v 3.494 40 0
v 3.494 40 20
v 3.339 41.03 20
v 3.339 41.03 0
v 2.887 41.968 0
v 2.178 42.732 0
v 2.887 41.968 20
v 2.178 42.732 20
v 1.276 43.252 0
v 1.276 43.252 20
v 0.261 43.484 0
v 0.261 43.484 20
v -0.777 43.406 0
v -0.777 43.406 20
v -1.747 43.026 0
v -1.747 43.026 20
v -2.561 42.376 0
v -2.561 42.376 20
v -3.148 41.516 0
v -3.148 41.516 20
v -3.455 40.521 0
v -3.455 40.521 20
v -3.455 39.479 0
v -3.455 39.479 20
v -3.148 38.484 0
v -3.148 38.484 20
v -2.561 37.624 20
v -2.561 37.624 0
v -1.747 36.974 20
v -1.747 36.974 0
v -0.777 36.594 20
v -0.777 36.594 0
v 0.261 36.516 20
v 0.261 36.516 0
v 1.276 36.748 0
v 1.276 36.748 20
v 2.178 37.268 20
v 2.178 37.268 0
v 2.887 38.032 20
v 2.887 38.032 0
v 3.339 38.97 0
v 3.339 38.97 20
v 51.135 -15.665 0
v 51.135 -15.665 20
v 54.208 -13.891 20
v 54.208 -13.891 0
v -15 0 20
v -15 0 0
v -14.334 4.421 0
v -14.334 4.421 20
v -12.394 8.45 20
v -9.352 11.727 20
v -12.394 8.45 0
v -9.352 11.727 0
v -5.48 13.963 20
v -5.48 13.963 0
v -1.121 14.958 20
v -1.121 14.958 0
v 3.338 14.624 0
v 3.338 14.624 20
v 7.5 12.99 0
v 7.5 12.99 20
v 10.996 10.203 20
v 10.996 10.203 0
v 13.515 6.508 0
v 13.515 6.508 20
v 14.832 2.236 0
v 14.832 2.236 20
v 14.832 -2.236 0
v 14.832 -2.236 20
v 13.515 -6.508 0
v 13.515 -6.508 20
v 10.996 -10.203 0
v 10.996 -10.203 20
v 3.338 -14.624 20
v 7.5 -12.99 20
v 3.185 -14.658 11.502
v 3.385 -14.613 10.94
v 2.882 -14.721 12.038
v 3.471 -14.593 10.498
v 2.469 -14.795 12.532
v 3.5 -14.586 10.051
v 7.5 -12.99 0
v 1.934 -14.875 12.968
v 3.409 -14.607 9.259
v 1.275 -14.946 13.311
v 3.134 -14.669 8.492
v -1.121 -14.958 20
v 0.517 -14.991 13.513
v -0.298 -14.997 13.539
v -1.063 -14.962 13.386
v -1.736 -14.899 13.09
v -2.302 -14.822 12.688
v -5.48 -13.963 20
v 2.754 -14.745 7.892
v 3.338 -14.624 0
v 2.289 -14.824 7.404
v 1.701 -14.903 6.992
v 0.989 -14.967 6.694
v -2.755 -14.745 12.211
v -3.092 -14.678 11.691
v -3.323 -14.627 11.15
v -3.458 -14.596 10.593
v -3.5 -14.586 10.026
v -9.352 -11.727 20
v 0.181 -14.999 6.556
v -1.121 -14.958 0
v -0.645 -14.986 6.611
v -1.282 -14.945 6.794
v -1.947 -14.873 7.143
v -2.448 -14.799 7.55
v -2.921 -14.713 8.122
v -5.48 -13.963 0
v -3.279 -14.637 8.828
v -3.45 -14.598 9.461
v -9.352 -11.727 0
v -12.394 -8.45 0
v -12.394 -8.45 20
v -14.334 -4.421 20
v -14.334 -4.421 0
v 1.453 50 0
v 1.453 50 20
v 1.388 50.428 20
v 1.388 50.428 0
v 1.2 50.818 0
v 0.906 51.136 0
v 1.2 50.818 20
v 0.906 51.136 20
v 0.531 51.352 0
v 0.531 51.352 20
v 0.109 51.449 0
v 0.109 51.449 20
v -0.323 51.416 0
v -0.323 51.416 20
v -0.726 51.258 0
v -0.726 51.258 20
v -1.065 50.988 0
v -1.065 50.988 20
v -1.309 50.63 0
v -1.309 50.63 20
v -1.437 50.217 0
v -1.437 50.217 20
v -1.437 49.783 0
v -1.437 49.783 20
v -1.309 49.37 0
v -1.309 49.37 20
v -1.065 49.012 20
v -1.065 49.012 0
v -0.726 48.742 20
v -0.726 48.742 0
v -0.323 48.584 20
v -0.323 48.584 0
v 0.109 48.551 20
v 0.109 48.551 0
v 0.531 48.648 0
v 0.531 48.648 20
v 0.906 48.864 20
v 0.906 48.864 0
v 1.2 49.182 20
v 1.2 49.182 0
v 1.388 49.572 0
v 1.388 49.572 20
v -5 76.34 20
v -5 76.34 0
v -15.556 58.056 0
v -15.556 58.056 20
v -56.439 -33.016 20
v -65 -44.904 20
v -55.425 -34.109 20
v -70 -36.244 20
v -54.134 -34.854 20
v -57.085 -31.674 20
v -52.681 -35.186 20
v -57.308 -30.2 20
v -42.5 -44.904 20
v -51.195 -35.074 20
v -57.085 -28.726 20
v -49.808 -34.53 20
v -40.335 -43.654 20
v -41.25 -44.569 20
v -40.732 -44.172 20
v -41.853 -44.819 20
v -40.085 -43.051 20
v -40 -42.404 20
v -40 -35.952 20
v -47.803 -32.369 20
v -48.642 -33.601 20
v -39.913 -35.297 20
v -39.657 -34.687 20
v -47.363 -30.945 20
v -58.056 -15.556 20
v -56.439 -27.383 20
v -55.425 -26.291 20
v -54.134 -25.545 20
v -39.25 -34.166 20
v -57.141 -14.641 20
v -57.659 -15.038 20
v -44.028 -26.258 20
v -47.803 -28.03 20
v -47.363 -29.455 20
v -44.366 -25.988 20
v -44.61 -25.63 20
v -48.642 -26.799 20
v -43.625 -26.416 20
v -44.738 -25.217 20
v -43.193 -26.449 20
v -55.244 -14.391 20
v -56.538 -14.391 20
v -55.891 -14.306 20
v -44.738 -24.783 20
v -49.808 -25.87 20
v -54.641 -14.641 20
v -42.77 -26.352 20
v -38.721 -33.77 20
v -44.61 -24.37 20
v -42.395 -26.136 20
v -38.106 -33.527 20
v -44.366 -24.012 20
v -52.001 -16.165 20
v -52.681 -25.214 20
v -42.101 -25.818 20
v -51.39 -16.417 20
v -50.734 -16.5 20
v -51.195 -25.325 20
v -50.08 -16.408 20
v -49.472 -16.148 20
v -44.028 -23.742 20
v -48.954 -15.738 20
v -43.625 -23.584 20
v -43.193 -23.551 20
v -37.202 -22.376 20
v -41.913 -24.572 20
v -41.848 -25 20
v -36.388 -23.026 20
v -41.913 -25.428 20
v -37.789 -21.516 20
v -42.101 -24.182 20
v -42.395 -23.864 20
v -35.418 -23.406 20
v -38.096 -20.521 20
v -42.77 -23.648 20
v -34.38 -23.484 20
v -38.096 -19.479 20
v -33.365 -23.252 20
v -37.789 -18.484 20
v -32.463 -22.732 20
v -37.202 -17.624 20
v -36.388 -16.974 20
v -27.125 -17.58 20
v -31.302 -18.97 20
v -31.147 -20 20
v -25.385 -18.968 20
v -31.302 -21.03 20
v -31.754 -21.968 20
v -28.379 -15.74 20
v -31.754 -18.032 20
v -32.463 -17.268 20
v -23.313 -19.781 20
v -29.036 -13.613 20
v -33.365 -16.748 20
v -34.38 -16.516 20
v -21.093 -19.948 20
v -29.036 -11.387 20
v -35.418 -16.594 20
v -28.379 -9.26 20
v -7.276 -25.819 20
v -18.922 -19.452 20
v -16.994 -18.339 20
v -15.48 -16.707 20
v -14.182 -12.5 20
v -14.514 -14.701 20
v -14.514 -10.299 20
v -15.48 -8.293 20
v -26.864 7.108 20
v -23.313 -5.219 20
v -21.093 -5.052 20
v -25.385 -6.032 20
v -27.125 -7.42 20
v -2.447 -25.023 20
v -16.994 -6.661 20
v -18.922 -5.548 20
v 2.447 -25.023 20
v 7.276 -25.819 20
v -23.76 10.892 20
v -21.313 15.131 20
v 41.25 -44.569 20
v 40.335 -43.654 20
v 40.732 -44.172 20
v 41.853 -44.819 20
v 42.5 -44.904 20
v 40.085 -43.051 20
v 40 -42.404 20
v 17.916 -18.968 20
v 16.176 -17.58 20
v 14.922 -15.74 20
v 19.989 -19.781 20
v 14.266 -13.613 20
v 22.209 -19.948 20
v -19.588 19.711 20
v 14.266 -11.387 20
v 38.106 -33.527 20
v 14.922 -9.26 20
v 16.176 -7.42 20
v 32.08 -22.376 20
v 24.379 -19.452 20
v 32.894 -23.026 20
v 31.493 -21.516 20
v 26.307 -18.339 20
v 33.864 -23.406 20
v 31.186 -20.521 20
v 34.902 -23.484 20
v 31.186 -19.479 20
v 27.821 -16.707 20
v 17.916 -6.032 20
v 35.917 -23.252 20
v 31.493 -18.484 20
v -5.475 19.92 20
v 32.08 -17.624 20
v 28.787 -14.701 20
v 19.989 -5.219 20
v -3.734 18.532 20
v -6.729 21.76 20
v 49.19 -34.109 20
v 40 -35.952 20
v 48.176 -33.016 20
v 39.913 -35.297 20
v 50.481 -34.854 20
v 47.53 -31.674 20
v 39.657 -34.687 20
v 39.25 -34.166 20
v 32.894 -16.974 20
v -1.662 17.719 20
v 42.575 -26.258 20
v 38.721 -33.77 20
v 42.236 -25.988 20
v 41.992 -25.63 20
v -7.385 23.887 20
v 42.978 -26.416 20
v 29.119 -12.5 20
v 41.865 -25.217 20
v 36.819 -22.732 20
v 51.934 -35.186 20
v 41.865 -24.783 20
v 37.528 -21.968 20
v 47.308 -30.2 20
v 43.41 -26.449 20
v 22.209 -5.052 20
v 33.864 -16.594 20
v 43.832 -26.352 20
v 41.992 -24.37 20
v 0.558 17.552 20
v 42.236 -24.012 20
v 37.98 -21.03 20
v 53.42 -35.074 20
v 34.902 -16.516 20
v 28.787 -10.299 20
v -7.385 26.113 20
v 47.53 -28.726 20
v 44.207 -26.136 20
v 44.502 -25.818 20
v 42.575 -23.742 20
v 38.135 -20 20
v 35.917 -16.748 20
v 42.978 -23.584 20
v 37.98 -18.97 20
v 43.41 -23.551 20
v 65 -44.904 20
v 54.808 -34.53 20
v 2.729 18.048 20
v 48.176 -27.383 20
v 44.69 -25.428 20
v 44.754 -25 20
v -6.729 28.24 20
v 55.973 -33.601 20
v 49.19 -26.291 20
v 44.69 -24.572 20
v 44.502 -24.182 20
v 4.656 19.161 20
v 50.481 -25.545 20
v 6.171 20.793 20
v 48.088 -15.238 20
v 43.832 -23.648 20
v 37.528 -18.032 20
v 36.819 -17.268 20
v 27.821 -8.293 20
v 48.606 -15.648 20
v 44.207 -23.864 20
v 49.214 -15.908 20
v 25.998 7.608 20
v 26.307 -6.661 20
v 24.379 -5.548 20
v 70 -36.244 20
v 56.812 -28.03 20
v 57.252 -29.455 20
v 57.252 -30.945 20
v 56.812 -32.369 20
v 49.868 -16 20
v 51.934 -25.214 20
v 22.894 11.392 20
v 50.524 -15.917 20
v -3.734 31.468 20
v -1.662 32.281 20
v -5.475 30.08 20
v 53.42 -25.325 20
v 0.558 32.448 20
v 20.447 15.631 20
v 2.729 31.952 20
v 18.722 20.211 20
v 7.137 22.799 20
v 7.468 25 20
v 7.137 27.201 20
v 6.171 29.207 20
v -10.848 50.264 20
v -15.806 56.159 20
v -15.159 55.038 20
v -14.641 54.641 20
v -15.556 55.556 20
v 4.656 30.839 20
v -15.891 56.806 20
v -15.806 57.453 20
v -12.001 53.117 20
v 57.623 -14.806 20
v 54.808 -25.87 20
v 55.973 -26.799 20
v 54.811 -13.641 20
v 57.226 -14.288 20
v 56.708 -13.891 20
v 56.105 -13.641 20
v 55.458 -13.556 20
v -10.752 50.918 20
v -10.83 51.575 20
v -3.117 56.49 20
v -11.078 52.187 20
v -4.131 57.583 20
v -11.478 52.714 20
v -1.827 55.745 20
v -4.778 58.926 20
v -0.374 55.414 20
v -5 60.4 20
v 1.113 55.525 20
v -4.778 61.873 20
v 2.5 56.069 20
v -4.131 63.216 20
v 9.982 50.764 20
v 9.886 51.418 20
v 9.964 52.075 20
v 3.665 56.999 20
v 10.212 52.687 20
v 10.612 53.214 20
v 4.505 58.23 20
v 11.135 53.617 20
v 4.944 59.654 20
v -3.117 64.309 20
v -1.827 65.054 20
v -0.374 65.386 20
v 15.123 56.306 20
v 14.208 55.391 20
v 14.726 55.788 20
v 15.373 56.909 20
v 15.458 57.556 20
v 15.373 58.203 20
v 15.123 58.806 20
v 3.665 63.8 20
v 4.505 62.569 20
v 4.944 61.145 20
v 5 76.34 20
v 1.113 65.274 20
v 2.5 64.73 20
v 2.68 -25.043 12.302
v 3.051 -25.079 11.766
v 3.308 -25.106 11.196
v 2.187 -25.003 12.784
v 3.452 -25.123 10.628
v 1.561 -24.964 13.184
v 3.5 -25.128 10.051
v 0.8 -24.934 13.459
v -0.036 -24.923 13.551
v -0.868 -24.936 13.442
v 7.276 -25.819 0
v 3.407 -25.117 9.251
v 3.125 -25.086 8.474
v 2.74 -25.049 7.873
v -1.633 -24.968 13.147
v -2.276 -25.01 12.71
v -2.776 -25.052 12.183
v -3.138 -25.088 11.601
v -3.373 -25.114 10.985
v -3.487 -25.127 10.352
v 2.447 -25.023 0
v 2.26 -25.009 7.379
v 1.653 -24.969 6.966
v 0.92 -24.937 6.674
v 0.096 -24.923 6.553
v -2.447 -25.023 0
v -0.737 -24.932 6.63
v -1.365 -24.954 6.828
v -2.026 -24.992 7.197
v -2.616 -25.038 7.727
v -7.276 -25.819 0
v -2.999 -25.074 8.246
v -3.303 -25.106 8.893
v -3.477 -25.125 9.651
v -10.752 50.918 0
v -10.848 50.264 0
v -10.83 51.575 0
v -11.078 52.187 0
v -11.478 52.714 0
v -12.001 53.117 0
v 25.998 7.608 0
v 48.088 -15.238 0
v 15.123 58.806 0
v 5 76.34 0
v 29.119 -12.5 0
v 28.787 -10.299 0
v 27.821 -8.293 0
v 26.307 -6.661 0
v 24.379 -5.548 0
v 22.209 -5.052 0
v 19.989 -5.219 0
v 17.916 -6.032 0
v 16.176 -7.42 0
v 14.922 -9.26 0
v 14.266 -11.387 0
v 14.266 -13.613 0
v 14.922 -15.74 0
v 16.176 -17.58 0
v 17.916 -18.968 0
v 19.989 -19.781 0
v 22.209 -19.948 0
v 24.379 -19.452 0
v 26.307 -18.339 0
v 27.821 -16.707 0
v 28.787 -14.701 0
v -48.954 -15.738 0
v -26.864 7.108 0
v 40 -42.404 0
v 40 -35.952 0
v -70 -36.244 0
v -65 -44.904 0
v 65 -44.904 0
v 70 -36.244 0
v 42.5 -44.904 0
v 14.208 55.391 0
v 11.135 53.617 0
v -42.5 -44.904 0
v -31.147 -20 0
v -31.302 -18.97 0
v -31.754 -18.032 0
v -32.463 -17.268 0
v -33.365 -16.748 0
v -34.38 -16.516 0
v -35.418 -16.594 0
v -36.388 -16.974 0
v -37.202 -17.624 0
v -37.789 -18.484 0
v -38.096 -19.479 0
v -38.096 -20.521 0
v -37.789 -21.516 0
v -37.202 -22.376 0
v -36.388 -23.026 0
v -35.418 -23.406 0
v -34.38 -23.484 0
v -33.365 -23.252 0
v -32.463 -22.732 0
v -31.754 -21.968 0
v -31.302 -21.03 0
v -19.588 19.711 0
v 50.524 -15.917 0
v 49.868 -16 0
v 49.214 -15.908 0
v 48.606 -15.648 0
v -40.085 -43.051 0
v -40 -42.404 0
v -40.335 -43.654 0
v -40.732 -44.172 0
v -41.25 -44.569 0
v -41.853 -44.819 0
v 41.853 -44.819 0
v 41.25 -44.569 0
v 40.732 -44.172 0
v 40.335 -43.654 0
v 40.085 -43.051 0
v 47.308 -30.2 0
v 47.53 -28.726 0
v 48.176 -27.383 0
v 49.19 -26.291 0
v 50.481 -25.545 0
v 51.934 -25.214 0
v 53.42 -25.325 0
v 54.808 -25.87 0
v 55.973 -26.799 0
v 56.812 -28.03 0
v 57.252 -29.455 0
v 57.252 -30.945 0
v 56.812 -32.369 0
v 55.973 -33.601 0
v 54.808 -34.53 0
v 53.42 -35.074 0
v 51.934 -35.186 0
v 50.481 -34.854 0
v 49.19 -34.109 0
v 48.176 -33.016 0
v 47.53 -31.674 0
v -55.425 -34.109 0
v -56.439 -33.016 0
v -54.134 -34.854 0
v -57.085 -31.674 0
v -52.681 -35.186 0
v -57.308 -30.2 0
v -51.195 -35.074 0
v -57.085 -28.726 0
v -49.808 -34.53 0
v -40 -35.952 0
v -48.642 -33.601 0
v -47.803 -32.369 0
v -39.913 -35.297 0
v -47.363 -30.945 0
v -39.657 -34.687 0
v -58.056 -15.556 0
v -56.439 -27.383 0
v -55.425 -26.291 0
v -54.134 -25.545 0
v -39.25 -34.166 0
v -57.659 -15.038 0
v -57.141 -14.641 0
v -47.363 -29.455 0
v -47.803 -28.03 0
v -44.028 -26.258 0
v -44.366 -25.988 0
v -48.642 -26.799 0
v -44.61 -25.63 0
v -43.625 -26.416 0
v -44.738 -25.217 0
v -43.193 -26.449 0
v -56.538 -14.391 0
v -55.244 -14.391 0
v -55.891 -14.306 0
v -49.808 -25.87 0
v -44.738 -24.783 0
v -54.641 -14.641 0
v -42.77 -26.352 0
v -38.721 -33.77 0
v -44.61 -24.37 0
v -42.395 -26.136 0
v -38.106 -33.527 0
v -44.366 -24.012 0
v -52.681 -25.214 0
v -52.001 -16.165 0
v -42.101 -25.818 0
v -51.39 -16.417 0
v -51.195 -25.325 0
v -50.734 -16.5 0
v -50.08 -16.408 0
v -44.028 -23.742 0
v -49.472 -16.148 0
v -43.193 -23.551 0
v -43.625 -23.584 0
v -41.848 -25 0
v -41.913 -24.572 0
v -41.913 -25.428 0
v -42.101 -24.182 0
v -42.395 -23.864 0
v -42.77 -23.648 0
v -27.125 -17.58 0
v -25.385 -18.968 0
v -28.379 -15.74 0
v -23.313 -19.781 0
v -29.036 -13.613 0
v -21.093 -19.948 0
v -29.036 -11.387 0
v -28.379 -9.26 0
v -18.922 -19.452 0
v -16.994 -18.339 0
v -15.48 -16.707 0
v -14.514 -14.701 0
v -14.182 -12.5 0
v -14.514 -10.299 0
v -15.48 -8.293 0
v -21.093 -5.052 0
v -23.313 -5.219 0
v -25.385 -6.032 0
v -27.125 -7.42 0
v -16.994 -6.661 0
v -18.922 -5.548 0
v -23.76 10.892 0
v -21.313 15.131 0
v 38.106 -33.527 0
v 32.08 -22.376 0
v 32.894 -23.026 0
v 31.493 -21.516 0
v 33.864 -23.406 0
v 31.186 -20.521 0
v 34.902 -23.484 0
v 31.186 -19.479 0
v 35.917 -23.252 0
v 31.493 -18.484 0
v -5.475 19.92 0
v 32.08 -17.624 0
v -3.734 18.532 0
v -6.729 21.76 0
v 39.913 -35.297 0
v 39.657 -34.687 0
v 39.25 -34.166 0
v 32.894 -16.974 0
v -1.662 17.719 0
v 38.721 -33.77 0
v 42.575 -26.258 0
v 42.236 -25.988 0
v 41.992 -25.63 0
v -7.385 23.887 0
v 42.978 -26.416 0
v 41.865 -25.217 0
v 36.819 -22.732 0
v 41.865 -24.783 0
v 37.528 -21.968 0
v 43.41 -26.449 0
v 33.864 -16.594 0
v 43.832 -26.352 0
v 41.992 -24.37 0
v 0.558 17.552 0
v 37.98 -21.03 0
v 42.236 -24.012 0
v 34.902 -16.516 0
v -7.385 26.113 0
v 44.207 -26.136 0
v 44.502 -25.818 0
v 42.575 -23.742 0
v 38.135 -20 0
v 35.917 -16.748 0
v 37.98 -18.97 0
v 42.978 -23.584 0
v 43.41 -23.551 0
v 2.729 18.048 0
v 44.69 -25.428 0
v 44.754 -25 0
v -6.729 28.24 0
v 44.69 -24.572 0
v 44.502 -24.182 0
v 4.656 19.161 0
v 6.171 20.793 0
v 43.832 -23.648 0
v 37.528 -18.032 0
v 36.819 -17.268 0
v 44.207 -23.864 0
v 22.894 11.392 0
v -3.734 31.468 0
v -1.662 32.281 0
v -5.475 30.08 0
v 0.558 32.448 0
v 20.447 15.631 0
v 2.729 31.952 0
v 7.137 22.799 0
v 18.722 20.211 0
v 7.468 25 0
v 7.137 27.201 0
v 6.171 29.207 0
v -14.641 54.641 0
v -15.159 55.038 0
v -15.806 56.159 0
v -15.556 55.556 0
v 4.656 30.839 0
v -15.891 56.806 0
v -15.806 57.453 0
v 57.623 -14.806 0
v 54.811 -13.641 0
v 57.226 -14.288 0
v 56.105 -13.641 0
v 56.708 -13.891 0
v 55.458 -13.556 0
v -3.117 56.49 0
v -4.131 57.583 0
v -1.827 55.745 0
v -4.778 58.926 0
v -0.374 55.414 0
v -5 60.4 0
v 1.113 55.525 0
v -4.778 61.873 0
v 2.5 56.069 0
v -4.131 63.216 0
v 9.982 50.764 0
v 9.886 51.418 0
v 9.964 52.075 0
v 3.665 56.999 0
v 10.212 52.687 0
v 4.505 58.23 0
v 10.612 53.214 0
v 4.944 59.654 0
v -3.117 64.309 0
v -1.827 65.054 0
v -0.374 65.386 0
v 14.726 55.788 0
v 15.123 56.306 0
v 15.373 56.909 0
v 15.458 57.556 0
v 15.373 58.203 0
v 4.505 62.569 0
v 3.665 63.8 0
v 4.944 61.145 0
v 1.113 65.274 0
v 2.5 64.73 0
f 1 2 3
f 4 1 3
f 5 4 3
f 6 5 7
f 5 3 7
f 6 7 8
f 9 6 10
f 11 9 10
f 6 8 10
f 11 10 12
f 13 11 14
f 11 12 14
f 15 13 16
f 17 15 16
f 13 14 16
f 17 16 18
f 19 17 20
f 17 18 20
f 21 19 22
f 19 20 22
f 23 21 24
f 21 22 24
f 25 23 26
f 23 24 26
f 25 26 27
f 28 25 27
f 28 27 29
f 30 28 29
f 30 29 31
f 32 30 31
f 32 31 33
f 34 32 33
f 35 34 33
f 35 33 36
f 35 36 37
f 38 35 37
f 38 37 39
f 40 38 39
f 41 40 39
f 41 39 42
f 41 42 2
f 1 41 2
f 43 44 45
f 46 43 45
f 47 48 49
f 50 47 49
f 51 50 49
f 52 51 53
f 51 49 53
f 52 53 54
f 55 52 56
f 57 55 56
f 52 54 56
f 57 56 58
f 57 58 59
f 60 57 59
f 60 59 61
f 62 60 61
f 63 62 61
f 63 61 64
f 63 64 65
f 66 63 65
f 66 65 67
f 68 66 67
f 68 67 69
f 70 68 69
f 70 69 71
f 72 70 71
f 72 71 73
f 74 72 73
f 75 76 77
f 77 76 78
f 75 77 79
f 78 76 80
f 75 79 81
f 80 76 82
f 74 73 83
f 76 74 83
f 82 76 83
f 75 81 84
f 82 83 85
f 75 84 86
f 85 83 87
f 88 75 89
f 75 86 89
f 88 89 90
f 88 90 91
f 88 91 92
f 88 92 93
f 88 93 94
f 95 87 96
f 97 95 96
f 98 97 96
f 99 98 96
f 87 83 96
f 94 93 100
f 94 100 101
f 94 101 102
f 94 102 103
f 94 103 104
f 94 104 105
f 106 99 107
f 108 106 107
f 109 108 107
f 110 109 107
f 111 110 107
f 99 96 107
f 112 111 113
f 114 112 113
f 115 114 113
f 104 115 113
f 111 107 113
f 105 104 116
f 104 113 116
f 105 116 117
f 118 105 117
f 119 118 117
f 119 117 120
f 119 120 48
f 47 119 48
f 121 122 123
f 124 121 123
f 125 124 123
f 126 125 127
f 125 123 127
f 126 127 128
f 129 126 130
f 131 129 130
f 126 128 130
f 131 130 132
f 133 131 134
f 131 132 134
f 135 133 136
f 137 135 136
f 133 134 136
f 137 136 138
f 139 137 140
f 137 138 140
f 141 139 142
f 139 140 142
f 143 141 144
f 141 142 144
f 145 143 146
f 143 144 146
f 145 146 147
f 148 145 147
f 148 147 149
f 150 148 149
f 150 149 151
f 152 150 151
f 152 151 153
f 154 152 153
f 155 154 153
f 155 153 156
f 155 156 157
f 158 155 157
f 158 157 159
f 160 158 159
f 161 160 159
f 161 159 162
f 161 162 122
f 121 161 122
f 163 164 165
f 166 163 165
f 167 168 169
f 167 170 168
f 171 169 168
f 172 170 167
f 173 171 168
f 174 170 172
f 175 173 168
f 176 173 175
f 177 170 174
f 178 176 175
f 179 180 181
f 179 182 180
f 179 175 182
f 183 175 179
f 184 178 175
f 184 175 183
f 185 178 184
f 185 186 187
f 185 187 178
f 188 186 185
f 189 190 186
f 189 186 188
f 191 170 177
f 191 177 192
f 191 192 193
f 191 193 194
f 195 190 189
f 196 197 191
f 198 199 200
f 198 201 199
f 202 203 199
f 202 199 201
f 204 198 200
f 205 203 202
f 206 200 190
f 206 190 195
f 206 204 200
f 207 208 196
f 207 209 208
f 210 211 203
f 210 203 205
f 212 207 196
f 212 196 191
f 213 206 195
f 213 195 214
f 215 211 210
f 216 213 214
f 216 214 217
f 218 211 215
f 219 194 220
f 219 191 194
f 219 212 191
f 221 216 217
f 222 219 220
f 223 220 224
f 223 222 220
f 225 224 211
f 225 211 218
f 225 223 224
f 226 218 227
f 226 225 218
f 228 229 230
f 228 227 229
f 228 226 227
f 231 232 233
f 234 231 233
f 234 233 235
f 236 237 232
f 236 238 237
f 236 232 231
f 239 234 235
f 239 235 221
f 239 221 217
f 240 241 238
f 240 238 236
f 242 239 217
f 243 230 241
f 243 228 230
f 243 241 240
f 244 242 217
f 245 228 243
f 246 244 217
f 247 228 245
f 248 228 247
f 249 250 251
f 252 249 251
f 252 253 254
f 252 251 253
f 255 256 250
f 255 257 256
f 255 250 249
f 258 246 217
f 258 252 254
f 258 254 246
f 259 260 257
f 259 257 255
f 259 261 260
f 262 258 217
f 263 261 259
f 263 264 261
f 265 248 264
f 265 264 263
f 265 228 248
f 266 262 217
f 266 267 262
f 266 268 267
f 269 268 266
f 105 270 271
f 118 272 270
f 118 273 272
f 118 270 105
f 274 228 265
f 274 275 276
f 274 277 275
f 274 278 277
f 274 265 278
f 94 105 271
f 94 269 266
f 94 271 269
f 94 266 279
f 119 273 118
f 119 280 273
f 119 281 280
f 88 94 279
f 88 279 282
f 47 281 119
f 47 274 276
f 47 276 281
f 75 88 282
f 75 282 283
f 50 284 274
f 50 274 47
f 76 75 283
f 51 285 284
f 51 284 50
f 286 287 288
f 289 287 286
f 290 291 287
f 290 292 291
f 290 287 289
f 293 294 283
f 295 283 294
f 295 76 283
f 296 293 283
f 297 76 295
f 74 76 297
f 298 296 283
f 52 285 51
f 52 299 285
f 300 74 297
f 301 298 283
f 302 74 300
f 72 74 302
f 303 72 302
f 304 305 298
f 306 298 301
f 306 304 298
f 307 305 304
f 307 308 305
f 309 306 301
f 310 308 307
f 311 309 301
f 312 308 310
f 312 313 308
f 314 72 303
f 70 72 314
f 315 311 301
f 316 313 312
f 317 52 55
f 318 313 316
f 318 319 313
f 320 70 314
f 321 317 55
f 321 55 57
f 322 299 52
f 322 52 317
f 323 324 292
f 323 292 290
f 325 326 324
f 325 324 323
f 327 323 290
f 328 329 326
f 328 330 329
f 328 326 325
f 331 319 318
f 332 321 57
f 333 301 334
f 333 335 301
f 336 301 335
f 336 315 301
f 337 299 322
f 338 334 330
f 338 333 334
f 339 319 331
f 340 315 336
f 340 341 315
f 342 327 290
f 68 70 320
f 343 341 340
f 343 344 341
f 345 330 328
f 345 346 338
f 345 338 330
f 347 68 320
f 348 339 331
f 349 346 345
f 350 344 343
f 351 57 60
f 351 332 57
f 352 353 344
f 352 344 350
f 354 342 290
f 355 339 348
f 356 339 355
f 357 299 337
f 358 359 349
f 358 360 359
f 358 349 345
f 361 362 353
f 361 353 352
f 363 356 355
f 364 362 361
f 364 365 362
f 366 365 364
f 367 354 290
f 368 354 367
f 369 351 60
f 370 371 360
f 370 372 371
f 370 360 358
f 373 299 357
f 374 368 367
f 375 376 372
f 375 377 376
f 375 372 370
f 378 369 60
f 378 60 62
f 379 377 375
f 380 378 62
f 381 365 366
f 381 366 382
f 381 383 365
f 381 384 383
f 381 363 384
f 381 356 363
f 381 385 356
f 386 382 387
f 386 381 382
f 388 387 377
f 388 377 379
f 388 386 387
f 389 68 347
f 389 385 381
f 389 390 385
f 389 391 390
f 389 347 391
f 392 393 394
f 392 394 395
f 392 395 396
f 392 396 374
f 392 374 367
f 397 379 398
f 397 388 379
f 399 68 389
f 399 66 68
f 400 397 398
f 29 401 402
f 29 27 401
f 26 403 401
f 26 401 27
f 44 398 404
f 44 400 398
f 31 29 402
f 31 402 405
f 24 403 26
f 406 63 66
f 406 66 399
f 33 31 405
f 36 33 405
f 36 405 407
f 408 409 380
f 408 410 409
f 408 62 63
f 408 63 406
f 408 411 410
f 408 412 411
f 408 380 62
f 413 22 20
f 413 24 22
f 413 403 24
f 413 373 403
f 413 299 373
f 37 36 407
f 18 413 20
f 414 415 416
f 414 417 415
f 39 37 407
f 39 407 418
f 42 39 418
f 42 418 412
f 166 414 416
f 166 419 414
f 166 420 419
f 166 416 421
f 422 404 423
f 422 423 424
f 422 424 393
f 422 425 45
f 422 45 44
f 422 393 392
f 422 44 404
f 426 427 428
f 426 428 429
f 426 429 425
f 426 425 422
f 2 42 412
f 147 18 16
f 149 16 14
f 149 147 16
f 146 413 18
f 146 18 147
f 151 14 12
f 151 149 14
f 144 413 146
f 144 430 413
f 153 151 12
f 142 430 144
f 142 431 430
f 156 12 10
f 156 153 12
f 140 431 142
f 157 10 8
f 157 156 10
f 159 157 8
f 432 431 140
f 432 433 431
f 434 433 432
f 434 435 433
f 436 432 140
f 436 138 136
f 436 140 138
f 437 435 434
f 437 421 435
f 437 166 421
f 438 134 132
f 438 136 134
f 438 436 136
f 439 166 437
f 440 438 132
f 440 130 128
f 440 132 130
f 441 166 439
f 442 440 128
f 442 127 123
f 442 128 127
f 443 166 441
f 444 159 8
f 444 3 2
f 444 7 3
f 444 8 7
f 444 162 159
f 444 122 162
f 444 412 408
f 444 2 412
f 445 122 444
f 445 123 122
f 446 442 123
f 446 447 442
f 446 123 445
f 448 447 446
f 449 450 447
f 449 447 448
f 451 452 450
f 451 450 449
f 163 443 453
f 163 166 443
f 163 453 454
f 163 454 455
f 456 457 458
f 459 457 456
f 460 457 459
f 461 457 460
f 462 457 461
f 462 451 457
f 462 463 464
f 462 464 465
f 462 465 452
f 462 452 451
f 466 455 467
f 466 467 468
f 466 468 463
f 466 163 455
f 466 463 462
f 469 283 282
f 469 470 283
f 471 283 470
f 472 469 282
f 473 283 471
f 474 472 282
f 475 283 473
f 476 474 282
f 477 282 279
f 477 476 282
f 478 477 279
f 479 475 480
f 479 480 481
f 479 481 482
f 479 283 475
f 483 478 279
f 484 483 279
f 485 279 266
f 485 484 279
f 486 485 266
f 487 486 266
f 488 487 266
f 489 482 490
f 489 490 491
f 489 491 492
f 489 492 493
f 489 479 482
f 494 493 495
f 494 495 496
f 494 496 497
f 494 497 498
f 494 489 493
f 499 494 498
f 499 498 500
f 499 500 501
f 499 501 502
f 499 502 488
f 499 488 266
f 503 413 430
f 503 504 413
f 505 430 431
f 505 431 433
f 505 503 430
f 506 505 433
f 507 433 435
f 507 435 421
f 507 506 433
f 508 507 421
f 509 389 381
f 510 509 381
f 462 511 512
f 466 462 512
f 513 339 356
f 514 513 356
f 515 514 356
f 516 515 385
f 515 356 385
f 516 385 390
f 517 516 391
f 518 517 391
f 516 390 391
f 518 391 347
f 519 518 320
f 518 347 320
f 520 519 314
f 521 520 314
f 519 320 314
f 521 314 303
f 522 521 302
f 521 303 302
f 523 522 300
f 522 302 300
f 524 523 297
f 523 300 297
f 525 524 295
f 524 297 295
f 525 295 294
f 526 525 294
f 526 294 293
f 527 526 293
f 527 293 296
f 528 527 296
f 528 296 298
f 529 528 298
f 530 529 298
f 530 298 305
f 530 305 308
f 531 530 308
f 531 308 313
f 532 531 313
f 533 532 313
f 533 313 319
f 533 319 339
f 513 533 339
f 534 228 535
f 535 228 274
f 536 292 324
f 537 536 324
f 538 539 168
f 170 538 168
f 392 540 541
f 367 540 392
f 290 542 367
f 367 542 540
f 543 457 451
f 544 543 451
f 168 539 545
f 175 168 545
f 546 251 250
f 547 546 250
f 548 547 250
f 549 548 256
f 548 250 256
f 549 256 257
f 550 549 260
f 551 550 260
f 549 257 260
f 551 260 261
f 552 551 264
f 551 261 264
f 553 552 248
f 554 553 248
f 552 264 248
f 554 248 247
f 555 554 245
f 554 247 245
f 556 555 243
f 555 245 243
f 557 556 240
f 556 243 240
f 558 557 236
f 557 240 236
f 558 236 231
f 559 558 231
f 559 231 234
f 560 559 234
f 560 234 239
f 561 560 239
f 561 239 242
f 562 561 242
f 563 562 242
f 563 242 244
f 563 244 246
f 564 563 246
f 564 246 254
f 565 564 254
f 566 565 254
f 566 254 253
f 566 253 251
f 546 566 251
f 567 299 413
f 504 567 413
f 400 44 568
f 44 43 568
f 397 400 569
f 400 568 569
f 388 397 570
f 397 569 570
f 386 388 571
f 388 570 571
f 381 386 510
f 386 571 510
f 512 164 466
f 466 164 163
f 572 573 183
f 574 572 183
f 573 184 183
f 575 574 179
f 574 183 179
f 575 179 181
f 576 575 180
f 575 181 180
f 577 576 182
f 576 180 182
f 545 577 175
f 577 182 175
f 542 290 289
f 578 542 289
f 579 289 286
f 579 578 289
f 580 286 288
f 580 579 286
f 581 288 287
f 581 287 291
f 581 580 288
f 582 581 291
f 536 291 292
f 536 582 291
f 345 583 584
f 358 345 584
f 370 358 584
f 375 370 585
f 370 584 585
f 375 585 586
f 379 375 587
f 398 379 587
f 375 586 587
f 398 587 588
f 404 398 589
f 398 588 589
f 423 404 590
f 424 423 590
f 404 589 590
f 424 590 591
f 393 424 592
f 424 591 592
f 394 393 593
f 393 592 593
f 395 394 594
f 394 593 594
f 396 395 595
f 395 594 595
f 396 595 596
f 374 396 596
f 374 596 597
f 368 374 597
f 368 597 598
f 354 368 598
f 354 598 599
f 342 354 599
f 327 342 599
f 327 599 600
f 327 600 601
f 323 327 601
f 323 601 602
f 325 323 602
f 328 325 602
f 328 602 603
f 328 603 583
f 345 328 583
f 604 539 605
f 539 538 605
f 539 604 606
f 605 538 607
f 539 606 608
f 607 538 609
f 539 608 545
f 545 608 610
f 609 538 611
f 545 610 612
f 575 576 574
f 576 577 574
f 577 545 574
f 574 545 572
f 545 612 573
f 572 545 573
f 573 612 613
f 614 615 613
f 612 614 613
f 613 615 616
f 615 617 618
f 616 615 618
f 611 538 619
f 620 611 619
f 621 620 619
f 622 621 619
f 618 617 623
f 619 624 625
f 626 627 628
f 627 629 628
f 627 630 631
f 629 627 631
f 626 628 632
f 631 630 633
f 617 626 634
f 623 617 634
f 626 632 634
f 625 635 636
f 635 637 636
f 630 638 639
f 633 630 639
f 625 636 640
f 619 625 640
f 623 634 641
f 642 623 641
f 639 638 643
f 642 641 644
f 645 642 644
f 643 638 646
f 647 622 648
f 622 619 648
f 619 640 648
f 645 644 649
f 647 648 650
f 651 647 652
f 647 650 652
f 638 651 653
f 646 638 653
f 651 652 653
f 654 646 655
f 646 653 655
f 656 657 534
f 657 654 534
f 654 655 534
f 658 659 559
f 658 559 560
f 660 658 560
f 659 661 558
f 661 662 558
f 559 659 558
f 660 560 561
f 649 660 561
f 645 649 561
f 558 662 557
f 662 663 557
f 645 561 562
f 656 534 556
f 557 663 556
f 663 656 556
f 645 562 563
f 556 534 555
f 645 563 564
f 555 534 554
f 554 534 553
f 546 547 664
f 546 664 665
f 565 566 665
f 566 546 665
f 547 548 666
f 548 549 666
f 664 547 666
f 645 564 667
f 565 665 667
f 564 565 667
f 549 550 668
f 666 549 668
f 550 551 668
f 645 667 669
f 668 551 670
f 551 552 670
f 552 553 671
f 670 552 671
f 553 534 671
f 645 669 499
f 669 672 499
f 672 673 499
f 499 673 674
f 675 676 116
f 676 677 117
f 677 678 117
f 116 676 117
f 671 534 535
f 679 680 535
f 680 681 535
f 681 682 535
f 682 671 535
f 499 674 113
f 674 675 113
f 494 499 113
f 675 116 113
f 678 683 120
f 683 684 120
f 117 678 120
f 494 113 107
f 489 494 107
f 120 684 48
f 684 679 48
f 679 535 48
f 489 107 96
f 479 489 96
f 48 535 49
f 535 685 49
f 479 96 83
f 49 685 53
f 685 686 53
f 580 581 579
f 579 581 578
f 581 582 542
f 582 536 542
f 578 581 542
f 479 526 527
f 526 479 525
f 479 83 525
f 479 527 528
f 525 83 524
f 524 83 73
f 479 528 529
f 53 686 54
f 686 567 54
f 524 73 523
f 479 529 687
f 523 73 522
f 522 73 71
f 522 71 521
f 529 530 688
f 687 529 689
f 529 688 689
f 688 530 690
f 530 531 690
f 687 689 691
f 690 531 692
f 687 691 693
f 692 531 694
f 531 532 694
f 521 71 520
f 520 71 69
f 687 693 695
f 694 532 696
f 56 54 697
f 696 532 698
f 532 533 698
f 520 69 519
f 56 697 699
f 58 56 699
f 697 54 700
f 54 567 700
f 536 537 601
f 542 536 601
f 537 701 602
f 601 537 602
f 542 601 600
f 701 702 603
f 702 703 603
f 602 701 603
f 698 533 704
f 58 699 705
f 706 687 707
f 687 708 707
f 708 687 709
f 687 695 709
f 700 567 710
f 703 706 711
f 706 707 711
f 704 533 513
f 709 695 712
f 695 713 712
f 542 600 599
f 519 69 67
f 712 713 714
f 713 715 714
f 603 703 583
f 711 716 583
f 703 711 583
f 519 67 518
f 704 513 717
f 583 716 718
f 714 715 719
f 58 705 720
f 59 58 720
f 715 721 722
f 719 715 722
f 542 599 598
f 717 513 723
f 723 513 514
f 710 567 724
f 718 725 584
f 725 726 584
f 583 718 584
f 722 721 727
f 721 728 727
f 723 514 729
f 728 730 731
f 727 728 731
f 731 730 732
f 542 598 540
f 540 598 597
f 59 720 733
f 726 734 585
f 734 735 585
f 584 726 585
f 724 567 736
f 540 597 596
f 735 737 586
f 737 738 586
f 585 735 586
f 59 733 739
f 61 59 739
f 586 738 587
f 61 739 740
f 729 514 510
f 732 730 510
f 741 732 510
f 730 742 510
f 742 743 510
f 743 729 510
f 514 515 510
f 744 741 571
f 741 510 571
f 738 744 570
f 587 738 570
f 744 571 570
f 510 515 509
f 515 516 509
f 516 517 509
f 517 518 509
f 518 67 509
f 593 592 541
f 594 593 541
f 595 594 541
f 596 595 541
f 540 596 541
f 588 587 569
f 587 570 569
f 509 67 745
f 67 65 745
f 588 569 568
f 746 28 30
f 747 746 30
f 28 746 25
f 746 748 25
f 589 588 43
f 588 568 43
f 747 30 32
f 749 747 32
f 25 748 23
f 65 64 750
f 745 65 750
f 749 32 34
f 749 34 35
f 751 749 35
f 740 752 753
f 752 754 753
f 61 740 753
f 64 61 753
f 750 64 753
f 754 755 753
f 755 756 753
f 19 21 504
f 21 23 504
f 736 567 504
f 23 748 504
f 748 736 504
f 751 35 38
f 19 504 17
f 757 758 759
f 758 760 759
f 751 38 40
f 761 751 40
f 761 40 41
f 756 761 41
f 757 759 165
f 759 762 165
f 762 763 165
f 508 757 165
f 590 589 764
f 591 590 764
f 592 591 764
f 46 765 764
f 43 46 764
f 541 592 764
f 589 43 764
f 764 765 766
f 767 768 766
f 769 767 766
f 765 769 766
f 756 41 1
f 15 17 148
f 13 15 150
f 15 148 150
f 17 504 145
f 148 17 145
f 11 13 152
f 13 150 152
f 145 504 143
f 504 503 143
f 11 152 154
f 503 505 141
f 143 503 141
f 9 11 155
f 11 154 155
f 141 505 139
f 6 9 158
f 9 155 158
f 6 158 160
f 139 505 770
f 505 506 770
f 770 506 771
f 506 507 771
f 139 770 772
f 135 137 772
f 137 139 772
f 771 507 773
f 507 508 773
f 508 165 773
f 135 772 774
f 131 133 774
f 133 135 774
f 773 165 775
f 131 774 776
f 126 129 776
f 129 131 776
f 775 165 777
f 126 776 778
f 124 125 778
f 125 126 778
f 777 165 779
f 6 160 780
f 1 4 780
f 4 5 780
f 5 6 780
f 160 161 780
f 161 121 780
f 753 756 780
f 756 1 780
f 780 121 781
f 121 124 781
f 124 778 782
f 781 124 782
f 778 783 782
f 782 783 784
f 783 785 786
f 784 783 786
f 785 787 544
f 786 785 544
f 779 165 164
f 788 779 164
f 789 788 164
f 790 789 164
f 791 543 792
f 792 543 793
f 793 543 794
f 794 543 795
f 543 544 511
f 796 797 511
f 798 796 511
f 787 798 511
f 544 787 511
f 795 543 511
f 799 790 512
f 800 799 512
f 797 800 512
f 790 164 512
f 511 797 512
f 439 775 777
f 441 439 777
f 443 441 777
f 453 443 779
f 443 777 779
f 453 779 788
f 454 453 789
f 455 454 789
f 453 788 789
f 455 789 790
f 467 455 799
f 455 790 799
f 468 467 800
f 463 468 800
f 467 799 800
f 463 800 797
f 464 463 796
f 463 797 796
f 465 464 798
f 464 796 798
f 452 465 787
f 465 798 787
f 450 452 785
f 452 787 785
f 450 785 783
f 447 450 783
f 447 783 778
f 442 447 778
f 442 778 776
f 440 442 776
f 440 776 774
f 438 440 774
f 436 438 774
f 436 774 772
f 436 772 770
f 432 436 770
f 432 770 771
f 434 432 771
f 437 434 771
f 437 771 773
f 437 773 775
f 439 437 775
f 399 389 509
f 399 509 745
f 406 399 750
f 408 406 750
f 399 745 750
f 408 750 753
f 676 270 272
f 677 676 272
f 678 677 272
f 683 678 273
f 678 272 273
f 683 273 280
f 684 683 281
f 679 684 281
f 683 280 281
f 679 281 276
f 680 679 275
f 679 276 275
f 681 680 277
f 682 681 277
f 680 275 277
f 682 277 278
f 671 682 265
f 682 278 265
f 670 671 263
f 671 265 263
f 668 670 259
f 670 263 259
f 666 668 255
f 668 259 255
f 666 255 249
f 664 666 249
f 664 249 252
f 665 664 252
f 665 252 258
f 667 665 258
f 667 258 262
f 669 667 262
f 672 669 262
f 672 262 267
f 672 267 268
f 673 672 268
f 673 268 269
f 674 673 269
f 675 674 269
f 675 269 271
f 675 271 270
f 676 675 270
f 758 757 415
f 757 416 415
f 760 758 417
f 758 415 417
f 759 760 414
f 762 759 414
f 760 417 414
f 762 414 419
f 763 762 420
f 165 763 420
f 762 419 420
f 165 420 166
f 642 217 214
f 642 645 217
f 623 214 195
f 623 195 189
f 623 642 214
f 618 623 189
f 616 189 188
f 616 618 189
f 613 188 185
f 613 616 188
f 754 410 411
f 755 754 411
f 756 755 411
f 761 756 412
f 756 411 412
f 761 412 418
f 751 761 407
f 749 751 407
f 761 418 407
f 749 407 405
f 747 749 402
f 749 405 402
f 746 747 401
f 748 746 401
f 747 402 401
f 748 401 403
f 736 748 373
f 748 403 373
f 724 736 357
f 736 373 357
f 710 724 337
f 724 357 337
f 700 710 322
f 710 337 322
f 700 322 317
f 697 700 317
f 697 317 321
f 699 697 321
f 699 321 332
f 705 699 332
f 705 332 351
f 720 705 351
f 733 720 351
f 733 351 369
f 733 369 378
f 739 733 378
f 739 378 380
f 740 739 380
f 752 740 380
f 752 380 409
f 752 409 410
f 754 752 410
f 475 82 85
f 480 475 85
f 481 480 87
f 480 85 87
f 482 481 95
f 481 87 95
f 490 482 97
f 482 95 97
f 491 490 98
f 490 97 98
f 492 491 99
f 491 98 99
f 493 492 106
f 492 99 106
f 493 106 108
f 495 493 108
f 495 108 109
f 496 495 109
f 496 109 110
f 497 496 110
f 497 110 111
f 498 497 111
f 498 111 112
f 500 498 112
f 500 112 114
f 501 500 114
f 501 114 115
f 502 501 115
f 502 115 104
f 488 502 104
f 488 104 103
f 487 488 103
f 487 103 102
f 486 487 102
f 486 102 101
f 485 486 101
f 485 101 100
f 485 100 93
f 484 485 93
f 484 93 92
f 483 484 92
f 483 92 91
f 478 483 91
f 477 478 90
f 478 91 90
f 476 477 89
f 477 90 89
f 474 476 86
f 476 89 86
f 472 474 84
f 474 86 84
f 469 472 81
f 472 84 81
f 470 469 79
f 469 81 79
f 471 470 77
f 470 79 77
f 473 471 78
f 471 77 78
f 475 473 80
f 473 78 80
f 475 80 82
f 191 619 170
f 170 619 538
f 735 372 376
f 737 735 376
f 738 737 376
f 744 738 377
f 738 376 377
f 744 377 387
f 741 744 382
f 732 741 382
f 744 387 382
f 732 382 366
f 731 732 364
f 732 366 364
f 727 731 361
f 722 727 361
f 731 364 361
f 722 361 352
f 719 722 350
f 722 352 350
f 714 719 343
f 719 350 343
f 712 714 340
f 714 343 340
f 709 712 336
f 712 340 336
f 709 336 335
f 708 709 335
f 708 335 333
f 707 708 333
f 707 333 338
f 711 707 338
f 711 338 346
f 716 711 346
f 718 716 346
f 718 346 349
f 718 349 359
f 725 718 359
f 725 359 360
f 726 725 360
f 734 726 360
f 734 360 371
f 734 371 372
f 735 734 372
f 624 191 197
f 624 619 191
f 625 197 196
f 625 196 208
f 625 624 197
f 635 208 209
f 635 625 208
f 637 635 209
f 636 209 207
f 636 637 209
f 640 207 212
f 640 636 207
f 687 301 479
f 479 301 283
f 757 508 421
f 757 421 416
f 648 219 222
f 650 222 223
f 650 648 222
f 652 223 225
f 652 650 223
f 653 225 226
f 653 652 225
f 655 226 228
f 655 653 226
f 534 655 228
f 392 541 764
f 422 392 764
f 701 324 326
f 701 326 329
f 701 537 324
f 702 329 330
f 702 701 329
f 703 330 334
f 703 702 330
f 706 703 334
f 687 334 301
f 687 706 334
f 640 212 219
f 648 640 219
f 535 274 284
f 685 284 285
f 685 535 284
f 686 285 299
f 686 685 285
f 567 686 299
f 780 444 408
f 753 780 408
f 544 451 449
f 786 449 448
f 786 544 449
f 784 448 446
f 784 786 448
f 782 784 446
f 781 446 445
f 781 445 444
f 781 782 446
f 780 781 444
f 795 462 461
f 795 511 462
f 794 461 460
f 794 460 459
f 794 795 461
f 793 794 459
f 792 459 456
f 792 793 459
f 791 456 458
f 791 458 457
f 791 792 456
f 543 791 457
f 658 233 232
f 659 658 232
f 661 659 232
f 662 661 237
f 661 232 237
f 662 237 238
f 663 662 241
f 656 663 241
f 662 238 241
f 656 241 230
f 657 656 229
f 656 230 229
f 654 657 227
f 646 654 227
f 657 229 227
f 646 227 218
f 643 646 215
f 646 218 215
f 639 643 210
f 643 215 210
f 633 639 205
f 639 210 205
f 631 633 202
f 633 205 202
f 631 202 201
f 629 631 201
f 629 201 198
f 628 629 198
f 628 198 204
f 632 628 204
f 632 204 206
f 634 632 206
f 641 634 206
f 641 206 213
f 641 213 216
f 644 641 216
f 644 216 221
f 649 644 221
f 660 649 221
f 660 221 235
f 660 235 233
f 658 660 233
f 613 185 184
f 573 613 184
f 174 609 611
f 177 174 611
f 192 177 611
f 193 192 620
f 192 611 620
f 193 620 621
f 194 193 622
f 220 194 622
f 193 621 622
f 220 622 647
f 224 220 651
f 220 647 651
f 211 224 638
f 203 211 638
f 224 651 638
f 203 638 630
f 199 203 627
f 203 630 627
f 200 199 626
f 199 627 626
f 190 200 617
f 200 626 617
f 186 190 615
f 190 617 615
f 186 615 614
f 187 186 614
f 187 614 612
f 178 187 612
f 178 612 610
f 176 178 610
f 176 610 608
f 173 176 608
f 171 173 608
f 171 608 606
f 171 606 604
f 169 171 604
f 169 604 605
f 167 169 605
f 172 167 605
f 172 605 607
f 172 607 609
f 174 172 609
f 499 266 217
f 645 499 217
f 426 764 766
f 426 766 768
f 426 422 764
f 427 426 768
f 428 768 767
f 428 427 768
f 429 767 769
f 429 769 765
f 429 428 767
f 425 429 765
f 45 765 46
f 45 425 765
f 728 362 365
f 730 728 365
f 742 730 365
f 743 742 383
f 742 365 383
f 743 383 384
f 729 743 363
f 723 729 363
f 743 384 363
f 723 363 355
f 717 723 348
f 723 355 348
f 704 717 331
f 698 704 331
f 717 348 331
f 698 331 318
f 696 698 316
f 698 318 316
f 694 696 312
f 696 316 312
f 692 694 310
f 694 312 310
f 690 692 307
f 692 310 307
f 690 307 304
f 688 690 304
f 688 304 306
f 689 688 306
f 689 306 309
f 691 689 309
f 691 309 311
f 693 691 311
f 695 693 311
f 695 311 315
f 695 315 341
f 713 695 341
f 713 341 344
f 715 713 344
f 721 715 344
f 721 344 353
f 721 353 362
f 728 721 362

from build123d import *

# Parameters (mm, degrees)
F1_DEPTH  = 20
F2_SIZE   = 10
F4_D      = 10
F4_DEPTH  = 100
F4_TIP    = 3.0043030951
F7_D      = 30
F7_DEPTH  = 100
F7_TIP    = 9.0129092854
F9_DEPTH  = 25
F10_R     = 2.5
F11_R     = 30
F12_R     = 1.4529244662
F12_R_2   = 3.4937424226
F12_R_3   = 7.4684037046
F13_DEPTH = 25
F15_D     = 7
F15_DEPTH = 100
F15_TIP   = 2.1030121666


with BuildPart() as f1:
    # F0 (on Top) → F1 (new body)
    with BuildSketch(Plane.XY):
        Polygon((75, -44.9038105677), (0, 85), (-75, -44.9038105677), align=None)
    extrude(amount=F1_DEPTH)

    # F2
    f2_edges = [f1.edges().sort_by_distance(p)[0] for p in [
        (-75, -44.903811, 10),
        (75, -44.903811, 10),
        (0, 85, 10),
    ]]
    chamfer(f2_edges, length=F2_SIZE)

    # F4
    with Locations(Plane.XY.offset(20)):
        with Locations((0, 60.3995919228), (52.3075809833, -30.1997959614), (-52.3075809833, -30.1997959614)):
            Hole(F4_D / 2, depth=F4_DEPTH)
            with Locations((0, 0, -(F4_DEPTH + F4_TIP / 2))):  # 118° drill point
                Cone(0, F4_D / 2, F4_TIP, mode=Mode.SUBTRACT)

    # F7
    with Locations(Plane.XY.offset(20)):
        with Locations((0, 0)):
            Hole(F7_D / 2, depth=F7_DEPTH)
            with Locations((0, 0, -(F7_DEPTH + F7_TIP / 2))):  # 118° drill point
                Cone(0, F7_D / 2, F7_TIP, mode=Mode.SUBTRACT)

    # F8 (on face) → F9 (cut)
    with BuildSketch(Plane.XY.offset(20)):
        Polygon((40, -34), (0, -24), (0, -48), (40, -48), align=None)
        Polygon((0, -48), (0, -24), (-40, -34), (-40, -48), align=None)
        Polygon((49.4448637287, -16.6410161514), (61.5692193817, -9.6410161514), (41.5692193817, 25), (20.7846096908, 13), align=None)
        Polygon((20.7846096908, 13), (41.5692193817, 25), (21.5692193817, 59.6410161514), (9.4448637287, 52.6410161514), align=None)
        Polygon((-10.3108891325, 52.1410161514), (-22.4352447854, 59.1410161514), (-42.4352447854, 24.5), (-21.6506350946, 12.5), align=None)
        Polygon((-21.6506350946, 12.5), (-42.4352447854, 24.5), (-62.4352447854, -10.1410161514), (-50.3108891325, -17.1410161514), align=None)
    extrude(amount=-F9_DEPTH, mode=Mode.SUBTRACT)

    # F10
    f10_edges = [f1.edges().sort_by_distance(p)[0] for p in [
        (-40, -34, 10),
        (-50.310889, -17.141016, 10),
        (-10.310889, 52.141016, 10),
        (9.444864, 52.641016, 10),
        (49.444864, -16.641016, 10),
        (40, -34, 10),
        (40, -44.903811, 10),
        (56.373067, -12.641016, 10),
        (16.373067, 56.641016, 10),
        (-16.80608, 55.891016, 10),
        (-56.80608, -13.391016, 10),
        (-40, -44.903811, 10),
    ]]
    fillet(f10_edges, radius=F10_R)

    # F11
    f11_edges = [f1.edges().sort_by_distance(p)[0] for p in [
        (0, -24, 10),
        (20.78461, 13, 10),
        (-21.650635, 12.5, 10),
    ]]
    fillet(f11_edges, radius=F11_R)

    # F12 (on face) → F13 (cut)
    with BuildSketch(Plane.XY.offset(20)):
        with Locations((0, 50)):
            Circle(F12_R)
        with Locations((0, 40)):
            Circle(F12_R_2)
        with Locations((0, 25)):
            Circle(F12_R_3)
        with Locations((-34.6410161514, -20)):
            Circle(F12_R_2)
        with Locations((-21.6506350946, -12.5)):
            Circle(F12_R_3)
        with Locations((-43.3012701892, -25)):
            Circle(F12_R)
        with Locations((34.6410161514, -20)):
            Circle(F12_R_2)
        with Locations((21.6506350946, -12.5)):
            Circle(F12_R_3)
        with Locations((43.3012701892, -25)):
            Circle(F12_R)
    extrude(amount=-F13_DEPTH, mode=Mode.SUBTRACT)

    # F15 (one way)
    with BuildSketch(Plane(origin=(0, 0, 0), x_dir=(1, 0, 0), z_dir=(0, 1, 0))):
        with Locations((0, -10.0512299687)):
            Circle(F15_D / 2)
    extrude(amount=-F15_DEPTH, mode=Mode.SUBTRACT)
    with Locations(Plane(origin=(0, 0, 0), x_dir=(1, 0, 0), z_dir=(0, 1, 0))):
        with Locations((0, -10.0512299687)):
            with Locations((0, 0, -(F15_DEPTH + F15_TIP / 2))):  # 118° drill point
                Cone(0, F15_D / 2, F15_TIP, mode=Mode.SUBTRACT)


solid = f1.part
